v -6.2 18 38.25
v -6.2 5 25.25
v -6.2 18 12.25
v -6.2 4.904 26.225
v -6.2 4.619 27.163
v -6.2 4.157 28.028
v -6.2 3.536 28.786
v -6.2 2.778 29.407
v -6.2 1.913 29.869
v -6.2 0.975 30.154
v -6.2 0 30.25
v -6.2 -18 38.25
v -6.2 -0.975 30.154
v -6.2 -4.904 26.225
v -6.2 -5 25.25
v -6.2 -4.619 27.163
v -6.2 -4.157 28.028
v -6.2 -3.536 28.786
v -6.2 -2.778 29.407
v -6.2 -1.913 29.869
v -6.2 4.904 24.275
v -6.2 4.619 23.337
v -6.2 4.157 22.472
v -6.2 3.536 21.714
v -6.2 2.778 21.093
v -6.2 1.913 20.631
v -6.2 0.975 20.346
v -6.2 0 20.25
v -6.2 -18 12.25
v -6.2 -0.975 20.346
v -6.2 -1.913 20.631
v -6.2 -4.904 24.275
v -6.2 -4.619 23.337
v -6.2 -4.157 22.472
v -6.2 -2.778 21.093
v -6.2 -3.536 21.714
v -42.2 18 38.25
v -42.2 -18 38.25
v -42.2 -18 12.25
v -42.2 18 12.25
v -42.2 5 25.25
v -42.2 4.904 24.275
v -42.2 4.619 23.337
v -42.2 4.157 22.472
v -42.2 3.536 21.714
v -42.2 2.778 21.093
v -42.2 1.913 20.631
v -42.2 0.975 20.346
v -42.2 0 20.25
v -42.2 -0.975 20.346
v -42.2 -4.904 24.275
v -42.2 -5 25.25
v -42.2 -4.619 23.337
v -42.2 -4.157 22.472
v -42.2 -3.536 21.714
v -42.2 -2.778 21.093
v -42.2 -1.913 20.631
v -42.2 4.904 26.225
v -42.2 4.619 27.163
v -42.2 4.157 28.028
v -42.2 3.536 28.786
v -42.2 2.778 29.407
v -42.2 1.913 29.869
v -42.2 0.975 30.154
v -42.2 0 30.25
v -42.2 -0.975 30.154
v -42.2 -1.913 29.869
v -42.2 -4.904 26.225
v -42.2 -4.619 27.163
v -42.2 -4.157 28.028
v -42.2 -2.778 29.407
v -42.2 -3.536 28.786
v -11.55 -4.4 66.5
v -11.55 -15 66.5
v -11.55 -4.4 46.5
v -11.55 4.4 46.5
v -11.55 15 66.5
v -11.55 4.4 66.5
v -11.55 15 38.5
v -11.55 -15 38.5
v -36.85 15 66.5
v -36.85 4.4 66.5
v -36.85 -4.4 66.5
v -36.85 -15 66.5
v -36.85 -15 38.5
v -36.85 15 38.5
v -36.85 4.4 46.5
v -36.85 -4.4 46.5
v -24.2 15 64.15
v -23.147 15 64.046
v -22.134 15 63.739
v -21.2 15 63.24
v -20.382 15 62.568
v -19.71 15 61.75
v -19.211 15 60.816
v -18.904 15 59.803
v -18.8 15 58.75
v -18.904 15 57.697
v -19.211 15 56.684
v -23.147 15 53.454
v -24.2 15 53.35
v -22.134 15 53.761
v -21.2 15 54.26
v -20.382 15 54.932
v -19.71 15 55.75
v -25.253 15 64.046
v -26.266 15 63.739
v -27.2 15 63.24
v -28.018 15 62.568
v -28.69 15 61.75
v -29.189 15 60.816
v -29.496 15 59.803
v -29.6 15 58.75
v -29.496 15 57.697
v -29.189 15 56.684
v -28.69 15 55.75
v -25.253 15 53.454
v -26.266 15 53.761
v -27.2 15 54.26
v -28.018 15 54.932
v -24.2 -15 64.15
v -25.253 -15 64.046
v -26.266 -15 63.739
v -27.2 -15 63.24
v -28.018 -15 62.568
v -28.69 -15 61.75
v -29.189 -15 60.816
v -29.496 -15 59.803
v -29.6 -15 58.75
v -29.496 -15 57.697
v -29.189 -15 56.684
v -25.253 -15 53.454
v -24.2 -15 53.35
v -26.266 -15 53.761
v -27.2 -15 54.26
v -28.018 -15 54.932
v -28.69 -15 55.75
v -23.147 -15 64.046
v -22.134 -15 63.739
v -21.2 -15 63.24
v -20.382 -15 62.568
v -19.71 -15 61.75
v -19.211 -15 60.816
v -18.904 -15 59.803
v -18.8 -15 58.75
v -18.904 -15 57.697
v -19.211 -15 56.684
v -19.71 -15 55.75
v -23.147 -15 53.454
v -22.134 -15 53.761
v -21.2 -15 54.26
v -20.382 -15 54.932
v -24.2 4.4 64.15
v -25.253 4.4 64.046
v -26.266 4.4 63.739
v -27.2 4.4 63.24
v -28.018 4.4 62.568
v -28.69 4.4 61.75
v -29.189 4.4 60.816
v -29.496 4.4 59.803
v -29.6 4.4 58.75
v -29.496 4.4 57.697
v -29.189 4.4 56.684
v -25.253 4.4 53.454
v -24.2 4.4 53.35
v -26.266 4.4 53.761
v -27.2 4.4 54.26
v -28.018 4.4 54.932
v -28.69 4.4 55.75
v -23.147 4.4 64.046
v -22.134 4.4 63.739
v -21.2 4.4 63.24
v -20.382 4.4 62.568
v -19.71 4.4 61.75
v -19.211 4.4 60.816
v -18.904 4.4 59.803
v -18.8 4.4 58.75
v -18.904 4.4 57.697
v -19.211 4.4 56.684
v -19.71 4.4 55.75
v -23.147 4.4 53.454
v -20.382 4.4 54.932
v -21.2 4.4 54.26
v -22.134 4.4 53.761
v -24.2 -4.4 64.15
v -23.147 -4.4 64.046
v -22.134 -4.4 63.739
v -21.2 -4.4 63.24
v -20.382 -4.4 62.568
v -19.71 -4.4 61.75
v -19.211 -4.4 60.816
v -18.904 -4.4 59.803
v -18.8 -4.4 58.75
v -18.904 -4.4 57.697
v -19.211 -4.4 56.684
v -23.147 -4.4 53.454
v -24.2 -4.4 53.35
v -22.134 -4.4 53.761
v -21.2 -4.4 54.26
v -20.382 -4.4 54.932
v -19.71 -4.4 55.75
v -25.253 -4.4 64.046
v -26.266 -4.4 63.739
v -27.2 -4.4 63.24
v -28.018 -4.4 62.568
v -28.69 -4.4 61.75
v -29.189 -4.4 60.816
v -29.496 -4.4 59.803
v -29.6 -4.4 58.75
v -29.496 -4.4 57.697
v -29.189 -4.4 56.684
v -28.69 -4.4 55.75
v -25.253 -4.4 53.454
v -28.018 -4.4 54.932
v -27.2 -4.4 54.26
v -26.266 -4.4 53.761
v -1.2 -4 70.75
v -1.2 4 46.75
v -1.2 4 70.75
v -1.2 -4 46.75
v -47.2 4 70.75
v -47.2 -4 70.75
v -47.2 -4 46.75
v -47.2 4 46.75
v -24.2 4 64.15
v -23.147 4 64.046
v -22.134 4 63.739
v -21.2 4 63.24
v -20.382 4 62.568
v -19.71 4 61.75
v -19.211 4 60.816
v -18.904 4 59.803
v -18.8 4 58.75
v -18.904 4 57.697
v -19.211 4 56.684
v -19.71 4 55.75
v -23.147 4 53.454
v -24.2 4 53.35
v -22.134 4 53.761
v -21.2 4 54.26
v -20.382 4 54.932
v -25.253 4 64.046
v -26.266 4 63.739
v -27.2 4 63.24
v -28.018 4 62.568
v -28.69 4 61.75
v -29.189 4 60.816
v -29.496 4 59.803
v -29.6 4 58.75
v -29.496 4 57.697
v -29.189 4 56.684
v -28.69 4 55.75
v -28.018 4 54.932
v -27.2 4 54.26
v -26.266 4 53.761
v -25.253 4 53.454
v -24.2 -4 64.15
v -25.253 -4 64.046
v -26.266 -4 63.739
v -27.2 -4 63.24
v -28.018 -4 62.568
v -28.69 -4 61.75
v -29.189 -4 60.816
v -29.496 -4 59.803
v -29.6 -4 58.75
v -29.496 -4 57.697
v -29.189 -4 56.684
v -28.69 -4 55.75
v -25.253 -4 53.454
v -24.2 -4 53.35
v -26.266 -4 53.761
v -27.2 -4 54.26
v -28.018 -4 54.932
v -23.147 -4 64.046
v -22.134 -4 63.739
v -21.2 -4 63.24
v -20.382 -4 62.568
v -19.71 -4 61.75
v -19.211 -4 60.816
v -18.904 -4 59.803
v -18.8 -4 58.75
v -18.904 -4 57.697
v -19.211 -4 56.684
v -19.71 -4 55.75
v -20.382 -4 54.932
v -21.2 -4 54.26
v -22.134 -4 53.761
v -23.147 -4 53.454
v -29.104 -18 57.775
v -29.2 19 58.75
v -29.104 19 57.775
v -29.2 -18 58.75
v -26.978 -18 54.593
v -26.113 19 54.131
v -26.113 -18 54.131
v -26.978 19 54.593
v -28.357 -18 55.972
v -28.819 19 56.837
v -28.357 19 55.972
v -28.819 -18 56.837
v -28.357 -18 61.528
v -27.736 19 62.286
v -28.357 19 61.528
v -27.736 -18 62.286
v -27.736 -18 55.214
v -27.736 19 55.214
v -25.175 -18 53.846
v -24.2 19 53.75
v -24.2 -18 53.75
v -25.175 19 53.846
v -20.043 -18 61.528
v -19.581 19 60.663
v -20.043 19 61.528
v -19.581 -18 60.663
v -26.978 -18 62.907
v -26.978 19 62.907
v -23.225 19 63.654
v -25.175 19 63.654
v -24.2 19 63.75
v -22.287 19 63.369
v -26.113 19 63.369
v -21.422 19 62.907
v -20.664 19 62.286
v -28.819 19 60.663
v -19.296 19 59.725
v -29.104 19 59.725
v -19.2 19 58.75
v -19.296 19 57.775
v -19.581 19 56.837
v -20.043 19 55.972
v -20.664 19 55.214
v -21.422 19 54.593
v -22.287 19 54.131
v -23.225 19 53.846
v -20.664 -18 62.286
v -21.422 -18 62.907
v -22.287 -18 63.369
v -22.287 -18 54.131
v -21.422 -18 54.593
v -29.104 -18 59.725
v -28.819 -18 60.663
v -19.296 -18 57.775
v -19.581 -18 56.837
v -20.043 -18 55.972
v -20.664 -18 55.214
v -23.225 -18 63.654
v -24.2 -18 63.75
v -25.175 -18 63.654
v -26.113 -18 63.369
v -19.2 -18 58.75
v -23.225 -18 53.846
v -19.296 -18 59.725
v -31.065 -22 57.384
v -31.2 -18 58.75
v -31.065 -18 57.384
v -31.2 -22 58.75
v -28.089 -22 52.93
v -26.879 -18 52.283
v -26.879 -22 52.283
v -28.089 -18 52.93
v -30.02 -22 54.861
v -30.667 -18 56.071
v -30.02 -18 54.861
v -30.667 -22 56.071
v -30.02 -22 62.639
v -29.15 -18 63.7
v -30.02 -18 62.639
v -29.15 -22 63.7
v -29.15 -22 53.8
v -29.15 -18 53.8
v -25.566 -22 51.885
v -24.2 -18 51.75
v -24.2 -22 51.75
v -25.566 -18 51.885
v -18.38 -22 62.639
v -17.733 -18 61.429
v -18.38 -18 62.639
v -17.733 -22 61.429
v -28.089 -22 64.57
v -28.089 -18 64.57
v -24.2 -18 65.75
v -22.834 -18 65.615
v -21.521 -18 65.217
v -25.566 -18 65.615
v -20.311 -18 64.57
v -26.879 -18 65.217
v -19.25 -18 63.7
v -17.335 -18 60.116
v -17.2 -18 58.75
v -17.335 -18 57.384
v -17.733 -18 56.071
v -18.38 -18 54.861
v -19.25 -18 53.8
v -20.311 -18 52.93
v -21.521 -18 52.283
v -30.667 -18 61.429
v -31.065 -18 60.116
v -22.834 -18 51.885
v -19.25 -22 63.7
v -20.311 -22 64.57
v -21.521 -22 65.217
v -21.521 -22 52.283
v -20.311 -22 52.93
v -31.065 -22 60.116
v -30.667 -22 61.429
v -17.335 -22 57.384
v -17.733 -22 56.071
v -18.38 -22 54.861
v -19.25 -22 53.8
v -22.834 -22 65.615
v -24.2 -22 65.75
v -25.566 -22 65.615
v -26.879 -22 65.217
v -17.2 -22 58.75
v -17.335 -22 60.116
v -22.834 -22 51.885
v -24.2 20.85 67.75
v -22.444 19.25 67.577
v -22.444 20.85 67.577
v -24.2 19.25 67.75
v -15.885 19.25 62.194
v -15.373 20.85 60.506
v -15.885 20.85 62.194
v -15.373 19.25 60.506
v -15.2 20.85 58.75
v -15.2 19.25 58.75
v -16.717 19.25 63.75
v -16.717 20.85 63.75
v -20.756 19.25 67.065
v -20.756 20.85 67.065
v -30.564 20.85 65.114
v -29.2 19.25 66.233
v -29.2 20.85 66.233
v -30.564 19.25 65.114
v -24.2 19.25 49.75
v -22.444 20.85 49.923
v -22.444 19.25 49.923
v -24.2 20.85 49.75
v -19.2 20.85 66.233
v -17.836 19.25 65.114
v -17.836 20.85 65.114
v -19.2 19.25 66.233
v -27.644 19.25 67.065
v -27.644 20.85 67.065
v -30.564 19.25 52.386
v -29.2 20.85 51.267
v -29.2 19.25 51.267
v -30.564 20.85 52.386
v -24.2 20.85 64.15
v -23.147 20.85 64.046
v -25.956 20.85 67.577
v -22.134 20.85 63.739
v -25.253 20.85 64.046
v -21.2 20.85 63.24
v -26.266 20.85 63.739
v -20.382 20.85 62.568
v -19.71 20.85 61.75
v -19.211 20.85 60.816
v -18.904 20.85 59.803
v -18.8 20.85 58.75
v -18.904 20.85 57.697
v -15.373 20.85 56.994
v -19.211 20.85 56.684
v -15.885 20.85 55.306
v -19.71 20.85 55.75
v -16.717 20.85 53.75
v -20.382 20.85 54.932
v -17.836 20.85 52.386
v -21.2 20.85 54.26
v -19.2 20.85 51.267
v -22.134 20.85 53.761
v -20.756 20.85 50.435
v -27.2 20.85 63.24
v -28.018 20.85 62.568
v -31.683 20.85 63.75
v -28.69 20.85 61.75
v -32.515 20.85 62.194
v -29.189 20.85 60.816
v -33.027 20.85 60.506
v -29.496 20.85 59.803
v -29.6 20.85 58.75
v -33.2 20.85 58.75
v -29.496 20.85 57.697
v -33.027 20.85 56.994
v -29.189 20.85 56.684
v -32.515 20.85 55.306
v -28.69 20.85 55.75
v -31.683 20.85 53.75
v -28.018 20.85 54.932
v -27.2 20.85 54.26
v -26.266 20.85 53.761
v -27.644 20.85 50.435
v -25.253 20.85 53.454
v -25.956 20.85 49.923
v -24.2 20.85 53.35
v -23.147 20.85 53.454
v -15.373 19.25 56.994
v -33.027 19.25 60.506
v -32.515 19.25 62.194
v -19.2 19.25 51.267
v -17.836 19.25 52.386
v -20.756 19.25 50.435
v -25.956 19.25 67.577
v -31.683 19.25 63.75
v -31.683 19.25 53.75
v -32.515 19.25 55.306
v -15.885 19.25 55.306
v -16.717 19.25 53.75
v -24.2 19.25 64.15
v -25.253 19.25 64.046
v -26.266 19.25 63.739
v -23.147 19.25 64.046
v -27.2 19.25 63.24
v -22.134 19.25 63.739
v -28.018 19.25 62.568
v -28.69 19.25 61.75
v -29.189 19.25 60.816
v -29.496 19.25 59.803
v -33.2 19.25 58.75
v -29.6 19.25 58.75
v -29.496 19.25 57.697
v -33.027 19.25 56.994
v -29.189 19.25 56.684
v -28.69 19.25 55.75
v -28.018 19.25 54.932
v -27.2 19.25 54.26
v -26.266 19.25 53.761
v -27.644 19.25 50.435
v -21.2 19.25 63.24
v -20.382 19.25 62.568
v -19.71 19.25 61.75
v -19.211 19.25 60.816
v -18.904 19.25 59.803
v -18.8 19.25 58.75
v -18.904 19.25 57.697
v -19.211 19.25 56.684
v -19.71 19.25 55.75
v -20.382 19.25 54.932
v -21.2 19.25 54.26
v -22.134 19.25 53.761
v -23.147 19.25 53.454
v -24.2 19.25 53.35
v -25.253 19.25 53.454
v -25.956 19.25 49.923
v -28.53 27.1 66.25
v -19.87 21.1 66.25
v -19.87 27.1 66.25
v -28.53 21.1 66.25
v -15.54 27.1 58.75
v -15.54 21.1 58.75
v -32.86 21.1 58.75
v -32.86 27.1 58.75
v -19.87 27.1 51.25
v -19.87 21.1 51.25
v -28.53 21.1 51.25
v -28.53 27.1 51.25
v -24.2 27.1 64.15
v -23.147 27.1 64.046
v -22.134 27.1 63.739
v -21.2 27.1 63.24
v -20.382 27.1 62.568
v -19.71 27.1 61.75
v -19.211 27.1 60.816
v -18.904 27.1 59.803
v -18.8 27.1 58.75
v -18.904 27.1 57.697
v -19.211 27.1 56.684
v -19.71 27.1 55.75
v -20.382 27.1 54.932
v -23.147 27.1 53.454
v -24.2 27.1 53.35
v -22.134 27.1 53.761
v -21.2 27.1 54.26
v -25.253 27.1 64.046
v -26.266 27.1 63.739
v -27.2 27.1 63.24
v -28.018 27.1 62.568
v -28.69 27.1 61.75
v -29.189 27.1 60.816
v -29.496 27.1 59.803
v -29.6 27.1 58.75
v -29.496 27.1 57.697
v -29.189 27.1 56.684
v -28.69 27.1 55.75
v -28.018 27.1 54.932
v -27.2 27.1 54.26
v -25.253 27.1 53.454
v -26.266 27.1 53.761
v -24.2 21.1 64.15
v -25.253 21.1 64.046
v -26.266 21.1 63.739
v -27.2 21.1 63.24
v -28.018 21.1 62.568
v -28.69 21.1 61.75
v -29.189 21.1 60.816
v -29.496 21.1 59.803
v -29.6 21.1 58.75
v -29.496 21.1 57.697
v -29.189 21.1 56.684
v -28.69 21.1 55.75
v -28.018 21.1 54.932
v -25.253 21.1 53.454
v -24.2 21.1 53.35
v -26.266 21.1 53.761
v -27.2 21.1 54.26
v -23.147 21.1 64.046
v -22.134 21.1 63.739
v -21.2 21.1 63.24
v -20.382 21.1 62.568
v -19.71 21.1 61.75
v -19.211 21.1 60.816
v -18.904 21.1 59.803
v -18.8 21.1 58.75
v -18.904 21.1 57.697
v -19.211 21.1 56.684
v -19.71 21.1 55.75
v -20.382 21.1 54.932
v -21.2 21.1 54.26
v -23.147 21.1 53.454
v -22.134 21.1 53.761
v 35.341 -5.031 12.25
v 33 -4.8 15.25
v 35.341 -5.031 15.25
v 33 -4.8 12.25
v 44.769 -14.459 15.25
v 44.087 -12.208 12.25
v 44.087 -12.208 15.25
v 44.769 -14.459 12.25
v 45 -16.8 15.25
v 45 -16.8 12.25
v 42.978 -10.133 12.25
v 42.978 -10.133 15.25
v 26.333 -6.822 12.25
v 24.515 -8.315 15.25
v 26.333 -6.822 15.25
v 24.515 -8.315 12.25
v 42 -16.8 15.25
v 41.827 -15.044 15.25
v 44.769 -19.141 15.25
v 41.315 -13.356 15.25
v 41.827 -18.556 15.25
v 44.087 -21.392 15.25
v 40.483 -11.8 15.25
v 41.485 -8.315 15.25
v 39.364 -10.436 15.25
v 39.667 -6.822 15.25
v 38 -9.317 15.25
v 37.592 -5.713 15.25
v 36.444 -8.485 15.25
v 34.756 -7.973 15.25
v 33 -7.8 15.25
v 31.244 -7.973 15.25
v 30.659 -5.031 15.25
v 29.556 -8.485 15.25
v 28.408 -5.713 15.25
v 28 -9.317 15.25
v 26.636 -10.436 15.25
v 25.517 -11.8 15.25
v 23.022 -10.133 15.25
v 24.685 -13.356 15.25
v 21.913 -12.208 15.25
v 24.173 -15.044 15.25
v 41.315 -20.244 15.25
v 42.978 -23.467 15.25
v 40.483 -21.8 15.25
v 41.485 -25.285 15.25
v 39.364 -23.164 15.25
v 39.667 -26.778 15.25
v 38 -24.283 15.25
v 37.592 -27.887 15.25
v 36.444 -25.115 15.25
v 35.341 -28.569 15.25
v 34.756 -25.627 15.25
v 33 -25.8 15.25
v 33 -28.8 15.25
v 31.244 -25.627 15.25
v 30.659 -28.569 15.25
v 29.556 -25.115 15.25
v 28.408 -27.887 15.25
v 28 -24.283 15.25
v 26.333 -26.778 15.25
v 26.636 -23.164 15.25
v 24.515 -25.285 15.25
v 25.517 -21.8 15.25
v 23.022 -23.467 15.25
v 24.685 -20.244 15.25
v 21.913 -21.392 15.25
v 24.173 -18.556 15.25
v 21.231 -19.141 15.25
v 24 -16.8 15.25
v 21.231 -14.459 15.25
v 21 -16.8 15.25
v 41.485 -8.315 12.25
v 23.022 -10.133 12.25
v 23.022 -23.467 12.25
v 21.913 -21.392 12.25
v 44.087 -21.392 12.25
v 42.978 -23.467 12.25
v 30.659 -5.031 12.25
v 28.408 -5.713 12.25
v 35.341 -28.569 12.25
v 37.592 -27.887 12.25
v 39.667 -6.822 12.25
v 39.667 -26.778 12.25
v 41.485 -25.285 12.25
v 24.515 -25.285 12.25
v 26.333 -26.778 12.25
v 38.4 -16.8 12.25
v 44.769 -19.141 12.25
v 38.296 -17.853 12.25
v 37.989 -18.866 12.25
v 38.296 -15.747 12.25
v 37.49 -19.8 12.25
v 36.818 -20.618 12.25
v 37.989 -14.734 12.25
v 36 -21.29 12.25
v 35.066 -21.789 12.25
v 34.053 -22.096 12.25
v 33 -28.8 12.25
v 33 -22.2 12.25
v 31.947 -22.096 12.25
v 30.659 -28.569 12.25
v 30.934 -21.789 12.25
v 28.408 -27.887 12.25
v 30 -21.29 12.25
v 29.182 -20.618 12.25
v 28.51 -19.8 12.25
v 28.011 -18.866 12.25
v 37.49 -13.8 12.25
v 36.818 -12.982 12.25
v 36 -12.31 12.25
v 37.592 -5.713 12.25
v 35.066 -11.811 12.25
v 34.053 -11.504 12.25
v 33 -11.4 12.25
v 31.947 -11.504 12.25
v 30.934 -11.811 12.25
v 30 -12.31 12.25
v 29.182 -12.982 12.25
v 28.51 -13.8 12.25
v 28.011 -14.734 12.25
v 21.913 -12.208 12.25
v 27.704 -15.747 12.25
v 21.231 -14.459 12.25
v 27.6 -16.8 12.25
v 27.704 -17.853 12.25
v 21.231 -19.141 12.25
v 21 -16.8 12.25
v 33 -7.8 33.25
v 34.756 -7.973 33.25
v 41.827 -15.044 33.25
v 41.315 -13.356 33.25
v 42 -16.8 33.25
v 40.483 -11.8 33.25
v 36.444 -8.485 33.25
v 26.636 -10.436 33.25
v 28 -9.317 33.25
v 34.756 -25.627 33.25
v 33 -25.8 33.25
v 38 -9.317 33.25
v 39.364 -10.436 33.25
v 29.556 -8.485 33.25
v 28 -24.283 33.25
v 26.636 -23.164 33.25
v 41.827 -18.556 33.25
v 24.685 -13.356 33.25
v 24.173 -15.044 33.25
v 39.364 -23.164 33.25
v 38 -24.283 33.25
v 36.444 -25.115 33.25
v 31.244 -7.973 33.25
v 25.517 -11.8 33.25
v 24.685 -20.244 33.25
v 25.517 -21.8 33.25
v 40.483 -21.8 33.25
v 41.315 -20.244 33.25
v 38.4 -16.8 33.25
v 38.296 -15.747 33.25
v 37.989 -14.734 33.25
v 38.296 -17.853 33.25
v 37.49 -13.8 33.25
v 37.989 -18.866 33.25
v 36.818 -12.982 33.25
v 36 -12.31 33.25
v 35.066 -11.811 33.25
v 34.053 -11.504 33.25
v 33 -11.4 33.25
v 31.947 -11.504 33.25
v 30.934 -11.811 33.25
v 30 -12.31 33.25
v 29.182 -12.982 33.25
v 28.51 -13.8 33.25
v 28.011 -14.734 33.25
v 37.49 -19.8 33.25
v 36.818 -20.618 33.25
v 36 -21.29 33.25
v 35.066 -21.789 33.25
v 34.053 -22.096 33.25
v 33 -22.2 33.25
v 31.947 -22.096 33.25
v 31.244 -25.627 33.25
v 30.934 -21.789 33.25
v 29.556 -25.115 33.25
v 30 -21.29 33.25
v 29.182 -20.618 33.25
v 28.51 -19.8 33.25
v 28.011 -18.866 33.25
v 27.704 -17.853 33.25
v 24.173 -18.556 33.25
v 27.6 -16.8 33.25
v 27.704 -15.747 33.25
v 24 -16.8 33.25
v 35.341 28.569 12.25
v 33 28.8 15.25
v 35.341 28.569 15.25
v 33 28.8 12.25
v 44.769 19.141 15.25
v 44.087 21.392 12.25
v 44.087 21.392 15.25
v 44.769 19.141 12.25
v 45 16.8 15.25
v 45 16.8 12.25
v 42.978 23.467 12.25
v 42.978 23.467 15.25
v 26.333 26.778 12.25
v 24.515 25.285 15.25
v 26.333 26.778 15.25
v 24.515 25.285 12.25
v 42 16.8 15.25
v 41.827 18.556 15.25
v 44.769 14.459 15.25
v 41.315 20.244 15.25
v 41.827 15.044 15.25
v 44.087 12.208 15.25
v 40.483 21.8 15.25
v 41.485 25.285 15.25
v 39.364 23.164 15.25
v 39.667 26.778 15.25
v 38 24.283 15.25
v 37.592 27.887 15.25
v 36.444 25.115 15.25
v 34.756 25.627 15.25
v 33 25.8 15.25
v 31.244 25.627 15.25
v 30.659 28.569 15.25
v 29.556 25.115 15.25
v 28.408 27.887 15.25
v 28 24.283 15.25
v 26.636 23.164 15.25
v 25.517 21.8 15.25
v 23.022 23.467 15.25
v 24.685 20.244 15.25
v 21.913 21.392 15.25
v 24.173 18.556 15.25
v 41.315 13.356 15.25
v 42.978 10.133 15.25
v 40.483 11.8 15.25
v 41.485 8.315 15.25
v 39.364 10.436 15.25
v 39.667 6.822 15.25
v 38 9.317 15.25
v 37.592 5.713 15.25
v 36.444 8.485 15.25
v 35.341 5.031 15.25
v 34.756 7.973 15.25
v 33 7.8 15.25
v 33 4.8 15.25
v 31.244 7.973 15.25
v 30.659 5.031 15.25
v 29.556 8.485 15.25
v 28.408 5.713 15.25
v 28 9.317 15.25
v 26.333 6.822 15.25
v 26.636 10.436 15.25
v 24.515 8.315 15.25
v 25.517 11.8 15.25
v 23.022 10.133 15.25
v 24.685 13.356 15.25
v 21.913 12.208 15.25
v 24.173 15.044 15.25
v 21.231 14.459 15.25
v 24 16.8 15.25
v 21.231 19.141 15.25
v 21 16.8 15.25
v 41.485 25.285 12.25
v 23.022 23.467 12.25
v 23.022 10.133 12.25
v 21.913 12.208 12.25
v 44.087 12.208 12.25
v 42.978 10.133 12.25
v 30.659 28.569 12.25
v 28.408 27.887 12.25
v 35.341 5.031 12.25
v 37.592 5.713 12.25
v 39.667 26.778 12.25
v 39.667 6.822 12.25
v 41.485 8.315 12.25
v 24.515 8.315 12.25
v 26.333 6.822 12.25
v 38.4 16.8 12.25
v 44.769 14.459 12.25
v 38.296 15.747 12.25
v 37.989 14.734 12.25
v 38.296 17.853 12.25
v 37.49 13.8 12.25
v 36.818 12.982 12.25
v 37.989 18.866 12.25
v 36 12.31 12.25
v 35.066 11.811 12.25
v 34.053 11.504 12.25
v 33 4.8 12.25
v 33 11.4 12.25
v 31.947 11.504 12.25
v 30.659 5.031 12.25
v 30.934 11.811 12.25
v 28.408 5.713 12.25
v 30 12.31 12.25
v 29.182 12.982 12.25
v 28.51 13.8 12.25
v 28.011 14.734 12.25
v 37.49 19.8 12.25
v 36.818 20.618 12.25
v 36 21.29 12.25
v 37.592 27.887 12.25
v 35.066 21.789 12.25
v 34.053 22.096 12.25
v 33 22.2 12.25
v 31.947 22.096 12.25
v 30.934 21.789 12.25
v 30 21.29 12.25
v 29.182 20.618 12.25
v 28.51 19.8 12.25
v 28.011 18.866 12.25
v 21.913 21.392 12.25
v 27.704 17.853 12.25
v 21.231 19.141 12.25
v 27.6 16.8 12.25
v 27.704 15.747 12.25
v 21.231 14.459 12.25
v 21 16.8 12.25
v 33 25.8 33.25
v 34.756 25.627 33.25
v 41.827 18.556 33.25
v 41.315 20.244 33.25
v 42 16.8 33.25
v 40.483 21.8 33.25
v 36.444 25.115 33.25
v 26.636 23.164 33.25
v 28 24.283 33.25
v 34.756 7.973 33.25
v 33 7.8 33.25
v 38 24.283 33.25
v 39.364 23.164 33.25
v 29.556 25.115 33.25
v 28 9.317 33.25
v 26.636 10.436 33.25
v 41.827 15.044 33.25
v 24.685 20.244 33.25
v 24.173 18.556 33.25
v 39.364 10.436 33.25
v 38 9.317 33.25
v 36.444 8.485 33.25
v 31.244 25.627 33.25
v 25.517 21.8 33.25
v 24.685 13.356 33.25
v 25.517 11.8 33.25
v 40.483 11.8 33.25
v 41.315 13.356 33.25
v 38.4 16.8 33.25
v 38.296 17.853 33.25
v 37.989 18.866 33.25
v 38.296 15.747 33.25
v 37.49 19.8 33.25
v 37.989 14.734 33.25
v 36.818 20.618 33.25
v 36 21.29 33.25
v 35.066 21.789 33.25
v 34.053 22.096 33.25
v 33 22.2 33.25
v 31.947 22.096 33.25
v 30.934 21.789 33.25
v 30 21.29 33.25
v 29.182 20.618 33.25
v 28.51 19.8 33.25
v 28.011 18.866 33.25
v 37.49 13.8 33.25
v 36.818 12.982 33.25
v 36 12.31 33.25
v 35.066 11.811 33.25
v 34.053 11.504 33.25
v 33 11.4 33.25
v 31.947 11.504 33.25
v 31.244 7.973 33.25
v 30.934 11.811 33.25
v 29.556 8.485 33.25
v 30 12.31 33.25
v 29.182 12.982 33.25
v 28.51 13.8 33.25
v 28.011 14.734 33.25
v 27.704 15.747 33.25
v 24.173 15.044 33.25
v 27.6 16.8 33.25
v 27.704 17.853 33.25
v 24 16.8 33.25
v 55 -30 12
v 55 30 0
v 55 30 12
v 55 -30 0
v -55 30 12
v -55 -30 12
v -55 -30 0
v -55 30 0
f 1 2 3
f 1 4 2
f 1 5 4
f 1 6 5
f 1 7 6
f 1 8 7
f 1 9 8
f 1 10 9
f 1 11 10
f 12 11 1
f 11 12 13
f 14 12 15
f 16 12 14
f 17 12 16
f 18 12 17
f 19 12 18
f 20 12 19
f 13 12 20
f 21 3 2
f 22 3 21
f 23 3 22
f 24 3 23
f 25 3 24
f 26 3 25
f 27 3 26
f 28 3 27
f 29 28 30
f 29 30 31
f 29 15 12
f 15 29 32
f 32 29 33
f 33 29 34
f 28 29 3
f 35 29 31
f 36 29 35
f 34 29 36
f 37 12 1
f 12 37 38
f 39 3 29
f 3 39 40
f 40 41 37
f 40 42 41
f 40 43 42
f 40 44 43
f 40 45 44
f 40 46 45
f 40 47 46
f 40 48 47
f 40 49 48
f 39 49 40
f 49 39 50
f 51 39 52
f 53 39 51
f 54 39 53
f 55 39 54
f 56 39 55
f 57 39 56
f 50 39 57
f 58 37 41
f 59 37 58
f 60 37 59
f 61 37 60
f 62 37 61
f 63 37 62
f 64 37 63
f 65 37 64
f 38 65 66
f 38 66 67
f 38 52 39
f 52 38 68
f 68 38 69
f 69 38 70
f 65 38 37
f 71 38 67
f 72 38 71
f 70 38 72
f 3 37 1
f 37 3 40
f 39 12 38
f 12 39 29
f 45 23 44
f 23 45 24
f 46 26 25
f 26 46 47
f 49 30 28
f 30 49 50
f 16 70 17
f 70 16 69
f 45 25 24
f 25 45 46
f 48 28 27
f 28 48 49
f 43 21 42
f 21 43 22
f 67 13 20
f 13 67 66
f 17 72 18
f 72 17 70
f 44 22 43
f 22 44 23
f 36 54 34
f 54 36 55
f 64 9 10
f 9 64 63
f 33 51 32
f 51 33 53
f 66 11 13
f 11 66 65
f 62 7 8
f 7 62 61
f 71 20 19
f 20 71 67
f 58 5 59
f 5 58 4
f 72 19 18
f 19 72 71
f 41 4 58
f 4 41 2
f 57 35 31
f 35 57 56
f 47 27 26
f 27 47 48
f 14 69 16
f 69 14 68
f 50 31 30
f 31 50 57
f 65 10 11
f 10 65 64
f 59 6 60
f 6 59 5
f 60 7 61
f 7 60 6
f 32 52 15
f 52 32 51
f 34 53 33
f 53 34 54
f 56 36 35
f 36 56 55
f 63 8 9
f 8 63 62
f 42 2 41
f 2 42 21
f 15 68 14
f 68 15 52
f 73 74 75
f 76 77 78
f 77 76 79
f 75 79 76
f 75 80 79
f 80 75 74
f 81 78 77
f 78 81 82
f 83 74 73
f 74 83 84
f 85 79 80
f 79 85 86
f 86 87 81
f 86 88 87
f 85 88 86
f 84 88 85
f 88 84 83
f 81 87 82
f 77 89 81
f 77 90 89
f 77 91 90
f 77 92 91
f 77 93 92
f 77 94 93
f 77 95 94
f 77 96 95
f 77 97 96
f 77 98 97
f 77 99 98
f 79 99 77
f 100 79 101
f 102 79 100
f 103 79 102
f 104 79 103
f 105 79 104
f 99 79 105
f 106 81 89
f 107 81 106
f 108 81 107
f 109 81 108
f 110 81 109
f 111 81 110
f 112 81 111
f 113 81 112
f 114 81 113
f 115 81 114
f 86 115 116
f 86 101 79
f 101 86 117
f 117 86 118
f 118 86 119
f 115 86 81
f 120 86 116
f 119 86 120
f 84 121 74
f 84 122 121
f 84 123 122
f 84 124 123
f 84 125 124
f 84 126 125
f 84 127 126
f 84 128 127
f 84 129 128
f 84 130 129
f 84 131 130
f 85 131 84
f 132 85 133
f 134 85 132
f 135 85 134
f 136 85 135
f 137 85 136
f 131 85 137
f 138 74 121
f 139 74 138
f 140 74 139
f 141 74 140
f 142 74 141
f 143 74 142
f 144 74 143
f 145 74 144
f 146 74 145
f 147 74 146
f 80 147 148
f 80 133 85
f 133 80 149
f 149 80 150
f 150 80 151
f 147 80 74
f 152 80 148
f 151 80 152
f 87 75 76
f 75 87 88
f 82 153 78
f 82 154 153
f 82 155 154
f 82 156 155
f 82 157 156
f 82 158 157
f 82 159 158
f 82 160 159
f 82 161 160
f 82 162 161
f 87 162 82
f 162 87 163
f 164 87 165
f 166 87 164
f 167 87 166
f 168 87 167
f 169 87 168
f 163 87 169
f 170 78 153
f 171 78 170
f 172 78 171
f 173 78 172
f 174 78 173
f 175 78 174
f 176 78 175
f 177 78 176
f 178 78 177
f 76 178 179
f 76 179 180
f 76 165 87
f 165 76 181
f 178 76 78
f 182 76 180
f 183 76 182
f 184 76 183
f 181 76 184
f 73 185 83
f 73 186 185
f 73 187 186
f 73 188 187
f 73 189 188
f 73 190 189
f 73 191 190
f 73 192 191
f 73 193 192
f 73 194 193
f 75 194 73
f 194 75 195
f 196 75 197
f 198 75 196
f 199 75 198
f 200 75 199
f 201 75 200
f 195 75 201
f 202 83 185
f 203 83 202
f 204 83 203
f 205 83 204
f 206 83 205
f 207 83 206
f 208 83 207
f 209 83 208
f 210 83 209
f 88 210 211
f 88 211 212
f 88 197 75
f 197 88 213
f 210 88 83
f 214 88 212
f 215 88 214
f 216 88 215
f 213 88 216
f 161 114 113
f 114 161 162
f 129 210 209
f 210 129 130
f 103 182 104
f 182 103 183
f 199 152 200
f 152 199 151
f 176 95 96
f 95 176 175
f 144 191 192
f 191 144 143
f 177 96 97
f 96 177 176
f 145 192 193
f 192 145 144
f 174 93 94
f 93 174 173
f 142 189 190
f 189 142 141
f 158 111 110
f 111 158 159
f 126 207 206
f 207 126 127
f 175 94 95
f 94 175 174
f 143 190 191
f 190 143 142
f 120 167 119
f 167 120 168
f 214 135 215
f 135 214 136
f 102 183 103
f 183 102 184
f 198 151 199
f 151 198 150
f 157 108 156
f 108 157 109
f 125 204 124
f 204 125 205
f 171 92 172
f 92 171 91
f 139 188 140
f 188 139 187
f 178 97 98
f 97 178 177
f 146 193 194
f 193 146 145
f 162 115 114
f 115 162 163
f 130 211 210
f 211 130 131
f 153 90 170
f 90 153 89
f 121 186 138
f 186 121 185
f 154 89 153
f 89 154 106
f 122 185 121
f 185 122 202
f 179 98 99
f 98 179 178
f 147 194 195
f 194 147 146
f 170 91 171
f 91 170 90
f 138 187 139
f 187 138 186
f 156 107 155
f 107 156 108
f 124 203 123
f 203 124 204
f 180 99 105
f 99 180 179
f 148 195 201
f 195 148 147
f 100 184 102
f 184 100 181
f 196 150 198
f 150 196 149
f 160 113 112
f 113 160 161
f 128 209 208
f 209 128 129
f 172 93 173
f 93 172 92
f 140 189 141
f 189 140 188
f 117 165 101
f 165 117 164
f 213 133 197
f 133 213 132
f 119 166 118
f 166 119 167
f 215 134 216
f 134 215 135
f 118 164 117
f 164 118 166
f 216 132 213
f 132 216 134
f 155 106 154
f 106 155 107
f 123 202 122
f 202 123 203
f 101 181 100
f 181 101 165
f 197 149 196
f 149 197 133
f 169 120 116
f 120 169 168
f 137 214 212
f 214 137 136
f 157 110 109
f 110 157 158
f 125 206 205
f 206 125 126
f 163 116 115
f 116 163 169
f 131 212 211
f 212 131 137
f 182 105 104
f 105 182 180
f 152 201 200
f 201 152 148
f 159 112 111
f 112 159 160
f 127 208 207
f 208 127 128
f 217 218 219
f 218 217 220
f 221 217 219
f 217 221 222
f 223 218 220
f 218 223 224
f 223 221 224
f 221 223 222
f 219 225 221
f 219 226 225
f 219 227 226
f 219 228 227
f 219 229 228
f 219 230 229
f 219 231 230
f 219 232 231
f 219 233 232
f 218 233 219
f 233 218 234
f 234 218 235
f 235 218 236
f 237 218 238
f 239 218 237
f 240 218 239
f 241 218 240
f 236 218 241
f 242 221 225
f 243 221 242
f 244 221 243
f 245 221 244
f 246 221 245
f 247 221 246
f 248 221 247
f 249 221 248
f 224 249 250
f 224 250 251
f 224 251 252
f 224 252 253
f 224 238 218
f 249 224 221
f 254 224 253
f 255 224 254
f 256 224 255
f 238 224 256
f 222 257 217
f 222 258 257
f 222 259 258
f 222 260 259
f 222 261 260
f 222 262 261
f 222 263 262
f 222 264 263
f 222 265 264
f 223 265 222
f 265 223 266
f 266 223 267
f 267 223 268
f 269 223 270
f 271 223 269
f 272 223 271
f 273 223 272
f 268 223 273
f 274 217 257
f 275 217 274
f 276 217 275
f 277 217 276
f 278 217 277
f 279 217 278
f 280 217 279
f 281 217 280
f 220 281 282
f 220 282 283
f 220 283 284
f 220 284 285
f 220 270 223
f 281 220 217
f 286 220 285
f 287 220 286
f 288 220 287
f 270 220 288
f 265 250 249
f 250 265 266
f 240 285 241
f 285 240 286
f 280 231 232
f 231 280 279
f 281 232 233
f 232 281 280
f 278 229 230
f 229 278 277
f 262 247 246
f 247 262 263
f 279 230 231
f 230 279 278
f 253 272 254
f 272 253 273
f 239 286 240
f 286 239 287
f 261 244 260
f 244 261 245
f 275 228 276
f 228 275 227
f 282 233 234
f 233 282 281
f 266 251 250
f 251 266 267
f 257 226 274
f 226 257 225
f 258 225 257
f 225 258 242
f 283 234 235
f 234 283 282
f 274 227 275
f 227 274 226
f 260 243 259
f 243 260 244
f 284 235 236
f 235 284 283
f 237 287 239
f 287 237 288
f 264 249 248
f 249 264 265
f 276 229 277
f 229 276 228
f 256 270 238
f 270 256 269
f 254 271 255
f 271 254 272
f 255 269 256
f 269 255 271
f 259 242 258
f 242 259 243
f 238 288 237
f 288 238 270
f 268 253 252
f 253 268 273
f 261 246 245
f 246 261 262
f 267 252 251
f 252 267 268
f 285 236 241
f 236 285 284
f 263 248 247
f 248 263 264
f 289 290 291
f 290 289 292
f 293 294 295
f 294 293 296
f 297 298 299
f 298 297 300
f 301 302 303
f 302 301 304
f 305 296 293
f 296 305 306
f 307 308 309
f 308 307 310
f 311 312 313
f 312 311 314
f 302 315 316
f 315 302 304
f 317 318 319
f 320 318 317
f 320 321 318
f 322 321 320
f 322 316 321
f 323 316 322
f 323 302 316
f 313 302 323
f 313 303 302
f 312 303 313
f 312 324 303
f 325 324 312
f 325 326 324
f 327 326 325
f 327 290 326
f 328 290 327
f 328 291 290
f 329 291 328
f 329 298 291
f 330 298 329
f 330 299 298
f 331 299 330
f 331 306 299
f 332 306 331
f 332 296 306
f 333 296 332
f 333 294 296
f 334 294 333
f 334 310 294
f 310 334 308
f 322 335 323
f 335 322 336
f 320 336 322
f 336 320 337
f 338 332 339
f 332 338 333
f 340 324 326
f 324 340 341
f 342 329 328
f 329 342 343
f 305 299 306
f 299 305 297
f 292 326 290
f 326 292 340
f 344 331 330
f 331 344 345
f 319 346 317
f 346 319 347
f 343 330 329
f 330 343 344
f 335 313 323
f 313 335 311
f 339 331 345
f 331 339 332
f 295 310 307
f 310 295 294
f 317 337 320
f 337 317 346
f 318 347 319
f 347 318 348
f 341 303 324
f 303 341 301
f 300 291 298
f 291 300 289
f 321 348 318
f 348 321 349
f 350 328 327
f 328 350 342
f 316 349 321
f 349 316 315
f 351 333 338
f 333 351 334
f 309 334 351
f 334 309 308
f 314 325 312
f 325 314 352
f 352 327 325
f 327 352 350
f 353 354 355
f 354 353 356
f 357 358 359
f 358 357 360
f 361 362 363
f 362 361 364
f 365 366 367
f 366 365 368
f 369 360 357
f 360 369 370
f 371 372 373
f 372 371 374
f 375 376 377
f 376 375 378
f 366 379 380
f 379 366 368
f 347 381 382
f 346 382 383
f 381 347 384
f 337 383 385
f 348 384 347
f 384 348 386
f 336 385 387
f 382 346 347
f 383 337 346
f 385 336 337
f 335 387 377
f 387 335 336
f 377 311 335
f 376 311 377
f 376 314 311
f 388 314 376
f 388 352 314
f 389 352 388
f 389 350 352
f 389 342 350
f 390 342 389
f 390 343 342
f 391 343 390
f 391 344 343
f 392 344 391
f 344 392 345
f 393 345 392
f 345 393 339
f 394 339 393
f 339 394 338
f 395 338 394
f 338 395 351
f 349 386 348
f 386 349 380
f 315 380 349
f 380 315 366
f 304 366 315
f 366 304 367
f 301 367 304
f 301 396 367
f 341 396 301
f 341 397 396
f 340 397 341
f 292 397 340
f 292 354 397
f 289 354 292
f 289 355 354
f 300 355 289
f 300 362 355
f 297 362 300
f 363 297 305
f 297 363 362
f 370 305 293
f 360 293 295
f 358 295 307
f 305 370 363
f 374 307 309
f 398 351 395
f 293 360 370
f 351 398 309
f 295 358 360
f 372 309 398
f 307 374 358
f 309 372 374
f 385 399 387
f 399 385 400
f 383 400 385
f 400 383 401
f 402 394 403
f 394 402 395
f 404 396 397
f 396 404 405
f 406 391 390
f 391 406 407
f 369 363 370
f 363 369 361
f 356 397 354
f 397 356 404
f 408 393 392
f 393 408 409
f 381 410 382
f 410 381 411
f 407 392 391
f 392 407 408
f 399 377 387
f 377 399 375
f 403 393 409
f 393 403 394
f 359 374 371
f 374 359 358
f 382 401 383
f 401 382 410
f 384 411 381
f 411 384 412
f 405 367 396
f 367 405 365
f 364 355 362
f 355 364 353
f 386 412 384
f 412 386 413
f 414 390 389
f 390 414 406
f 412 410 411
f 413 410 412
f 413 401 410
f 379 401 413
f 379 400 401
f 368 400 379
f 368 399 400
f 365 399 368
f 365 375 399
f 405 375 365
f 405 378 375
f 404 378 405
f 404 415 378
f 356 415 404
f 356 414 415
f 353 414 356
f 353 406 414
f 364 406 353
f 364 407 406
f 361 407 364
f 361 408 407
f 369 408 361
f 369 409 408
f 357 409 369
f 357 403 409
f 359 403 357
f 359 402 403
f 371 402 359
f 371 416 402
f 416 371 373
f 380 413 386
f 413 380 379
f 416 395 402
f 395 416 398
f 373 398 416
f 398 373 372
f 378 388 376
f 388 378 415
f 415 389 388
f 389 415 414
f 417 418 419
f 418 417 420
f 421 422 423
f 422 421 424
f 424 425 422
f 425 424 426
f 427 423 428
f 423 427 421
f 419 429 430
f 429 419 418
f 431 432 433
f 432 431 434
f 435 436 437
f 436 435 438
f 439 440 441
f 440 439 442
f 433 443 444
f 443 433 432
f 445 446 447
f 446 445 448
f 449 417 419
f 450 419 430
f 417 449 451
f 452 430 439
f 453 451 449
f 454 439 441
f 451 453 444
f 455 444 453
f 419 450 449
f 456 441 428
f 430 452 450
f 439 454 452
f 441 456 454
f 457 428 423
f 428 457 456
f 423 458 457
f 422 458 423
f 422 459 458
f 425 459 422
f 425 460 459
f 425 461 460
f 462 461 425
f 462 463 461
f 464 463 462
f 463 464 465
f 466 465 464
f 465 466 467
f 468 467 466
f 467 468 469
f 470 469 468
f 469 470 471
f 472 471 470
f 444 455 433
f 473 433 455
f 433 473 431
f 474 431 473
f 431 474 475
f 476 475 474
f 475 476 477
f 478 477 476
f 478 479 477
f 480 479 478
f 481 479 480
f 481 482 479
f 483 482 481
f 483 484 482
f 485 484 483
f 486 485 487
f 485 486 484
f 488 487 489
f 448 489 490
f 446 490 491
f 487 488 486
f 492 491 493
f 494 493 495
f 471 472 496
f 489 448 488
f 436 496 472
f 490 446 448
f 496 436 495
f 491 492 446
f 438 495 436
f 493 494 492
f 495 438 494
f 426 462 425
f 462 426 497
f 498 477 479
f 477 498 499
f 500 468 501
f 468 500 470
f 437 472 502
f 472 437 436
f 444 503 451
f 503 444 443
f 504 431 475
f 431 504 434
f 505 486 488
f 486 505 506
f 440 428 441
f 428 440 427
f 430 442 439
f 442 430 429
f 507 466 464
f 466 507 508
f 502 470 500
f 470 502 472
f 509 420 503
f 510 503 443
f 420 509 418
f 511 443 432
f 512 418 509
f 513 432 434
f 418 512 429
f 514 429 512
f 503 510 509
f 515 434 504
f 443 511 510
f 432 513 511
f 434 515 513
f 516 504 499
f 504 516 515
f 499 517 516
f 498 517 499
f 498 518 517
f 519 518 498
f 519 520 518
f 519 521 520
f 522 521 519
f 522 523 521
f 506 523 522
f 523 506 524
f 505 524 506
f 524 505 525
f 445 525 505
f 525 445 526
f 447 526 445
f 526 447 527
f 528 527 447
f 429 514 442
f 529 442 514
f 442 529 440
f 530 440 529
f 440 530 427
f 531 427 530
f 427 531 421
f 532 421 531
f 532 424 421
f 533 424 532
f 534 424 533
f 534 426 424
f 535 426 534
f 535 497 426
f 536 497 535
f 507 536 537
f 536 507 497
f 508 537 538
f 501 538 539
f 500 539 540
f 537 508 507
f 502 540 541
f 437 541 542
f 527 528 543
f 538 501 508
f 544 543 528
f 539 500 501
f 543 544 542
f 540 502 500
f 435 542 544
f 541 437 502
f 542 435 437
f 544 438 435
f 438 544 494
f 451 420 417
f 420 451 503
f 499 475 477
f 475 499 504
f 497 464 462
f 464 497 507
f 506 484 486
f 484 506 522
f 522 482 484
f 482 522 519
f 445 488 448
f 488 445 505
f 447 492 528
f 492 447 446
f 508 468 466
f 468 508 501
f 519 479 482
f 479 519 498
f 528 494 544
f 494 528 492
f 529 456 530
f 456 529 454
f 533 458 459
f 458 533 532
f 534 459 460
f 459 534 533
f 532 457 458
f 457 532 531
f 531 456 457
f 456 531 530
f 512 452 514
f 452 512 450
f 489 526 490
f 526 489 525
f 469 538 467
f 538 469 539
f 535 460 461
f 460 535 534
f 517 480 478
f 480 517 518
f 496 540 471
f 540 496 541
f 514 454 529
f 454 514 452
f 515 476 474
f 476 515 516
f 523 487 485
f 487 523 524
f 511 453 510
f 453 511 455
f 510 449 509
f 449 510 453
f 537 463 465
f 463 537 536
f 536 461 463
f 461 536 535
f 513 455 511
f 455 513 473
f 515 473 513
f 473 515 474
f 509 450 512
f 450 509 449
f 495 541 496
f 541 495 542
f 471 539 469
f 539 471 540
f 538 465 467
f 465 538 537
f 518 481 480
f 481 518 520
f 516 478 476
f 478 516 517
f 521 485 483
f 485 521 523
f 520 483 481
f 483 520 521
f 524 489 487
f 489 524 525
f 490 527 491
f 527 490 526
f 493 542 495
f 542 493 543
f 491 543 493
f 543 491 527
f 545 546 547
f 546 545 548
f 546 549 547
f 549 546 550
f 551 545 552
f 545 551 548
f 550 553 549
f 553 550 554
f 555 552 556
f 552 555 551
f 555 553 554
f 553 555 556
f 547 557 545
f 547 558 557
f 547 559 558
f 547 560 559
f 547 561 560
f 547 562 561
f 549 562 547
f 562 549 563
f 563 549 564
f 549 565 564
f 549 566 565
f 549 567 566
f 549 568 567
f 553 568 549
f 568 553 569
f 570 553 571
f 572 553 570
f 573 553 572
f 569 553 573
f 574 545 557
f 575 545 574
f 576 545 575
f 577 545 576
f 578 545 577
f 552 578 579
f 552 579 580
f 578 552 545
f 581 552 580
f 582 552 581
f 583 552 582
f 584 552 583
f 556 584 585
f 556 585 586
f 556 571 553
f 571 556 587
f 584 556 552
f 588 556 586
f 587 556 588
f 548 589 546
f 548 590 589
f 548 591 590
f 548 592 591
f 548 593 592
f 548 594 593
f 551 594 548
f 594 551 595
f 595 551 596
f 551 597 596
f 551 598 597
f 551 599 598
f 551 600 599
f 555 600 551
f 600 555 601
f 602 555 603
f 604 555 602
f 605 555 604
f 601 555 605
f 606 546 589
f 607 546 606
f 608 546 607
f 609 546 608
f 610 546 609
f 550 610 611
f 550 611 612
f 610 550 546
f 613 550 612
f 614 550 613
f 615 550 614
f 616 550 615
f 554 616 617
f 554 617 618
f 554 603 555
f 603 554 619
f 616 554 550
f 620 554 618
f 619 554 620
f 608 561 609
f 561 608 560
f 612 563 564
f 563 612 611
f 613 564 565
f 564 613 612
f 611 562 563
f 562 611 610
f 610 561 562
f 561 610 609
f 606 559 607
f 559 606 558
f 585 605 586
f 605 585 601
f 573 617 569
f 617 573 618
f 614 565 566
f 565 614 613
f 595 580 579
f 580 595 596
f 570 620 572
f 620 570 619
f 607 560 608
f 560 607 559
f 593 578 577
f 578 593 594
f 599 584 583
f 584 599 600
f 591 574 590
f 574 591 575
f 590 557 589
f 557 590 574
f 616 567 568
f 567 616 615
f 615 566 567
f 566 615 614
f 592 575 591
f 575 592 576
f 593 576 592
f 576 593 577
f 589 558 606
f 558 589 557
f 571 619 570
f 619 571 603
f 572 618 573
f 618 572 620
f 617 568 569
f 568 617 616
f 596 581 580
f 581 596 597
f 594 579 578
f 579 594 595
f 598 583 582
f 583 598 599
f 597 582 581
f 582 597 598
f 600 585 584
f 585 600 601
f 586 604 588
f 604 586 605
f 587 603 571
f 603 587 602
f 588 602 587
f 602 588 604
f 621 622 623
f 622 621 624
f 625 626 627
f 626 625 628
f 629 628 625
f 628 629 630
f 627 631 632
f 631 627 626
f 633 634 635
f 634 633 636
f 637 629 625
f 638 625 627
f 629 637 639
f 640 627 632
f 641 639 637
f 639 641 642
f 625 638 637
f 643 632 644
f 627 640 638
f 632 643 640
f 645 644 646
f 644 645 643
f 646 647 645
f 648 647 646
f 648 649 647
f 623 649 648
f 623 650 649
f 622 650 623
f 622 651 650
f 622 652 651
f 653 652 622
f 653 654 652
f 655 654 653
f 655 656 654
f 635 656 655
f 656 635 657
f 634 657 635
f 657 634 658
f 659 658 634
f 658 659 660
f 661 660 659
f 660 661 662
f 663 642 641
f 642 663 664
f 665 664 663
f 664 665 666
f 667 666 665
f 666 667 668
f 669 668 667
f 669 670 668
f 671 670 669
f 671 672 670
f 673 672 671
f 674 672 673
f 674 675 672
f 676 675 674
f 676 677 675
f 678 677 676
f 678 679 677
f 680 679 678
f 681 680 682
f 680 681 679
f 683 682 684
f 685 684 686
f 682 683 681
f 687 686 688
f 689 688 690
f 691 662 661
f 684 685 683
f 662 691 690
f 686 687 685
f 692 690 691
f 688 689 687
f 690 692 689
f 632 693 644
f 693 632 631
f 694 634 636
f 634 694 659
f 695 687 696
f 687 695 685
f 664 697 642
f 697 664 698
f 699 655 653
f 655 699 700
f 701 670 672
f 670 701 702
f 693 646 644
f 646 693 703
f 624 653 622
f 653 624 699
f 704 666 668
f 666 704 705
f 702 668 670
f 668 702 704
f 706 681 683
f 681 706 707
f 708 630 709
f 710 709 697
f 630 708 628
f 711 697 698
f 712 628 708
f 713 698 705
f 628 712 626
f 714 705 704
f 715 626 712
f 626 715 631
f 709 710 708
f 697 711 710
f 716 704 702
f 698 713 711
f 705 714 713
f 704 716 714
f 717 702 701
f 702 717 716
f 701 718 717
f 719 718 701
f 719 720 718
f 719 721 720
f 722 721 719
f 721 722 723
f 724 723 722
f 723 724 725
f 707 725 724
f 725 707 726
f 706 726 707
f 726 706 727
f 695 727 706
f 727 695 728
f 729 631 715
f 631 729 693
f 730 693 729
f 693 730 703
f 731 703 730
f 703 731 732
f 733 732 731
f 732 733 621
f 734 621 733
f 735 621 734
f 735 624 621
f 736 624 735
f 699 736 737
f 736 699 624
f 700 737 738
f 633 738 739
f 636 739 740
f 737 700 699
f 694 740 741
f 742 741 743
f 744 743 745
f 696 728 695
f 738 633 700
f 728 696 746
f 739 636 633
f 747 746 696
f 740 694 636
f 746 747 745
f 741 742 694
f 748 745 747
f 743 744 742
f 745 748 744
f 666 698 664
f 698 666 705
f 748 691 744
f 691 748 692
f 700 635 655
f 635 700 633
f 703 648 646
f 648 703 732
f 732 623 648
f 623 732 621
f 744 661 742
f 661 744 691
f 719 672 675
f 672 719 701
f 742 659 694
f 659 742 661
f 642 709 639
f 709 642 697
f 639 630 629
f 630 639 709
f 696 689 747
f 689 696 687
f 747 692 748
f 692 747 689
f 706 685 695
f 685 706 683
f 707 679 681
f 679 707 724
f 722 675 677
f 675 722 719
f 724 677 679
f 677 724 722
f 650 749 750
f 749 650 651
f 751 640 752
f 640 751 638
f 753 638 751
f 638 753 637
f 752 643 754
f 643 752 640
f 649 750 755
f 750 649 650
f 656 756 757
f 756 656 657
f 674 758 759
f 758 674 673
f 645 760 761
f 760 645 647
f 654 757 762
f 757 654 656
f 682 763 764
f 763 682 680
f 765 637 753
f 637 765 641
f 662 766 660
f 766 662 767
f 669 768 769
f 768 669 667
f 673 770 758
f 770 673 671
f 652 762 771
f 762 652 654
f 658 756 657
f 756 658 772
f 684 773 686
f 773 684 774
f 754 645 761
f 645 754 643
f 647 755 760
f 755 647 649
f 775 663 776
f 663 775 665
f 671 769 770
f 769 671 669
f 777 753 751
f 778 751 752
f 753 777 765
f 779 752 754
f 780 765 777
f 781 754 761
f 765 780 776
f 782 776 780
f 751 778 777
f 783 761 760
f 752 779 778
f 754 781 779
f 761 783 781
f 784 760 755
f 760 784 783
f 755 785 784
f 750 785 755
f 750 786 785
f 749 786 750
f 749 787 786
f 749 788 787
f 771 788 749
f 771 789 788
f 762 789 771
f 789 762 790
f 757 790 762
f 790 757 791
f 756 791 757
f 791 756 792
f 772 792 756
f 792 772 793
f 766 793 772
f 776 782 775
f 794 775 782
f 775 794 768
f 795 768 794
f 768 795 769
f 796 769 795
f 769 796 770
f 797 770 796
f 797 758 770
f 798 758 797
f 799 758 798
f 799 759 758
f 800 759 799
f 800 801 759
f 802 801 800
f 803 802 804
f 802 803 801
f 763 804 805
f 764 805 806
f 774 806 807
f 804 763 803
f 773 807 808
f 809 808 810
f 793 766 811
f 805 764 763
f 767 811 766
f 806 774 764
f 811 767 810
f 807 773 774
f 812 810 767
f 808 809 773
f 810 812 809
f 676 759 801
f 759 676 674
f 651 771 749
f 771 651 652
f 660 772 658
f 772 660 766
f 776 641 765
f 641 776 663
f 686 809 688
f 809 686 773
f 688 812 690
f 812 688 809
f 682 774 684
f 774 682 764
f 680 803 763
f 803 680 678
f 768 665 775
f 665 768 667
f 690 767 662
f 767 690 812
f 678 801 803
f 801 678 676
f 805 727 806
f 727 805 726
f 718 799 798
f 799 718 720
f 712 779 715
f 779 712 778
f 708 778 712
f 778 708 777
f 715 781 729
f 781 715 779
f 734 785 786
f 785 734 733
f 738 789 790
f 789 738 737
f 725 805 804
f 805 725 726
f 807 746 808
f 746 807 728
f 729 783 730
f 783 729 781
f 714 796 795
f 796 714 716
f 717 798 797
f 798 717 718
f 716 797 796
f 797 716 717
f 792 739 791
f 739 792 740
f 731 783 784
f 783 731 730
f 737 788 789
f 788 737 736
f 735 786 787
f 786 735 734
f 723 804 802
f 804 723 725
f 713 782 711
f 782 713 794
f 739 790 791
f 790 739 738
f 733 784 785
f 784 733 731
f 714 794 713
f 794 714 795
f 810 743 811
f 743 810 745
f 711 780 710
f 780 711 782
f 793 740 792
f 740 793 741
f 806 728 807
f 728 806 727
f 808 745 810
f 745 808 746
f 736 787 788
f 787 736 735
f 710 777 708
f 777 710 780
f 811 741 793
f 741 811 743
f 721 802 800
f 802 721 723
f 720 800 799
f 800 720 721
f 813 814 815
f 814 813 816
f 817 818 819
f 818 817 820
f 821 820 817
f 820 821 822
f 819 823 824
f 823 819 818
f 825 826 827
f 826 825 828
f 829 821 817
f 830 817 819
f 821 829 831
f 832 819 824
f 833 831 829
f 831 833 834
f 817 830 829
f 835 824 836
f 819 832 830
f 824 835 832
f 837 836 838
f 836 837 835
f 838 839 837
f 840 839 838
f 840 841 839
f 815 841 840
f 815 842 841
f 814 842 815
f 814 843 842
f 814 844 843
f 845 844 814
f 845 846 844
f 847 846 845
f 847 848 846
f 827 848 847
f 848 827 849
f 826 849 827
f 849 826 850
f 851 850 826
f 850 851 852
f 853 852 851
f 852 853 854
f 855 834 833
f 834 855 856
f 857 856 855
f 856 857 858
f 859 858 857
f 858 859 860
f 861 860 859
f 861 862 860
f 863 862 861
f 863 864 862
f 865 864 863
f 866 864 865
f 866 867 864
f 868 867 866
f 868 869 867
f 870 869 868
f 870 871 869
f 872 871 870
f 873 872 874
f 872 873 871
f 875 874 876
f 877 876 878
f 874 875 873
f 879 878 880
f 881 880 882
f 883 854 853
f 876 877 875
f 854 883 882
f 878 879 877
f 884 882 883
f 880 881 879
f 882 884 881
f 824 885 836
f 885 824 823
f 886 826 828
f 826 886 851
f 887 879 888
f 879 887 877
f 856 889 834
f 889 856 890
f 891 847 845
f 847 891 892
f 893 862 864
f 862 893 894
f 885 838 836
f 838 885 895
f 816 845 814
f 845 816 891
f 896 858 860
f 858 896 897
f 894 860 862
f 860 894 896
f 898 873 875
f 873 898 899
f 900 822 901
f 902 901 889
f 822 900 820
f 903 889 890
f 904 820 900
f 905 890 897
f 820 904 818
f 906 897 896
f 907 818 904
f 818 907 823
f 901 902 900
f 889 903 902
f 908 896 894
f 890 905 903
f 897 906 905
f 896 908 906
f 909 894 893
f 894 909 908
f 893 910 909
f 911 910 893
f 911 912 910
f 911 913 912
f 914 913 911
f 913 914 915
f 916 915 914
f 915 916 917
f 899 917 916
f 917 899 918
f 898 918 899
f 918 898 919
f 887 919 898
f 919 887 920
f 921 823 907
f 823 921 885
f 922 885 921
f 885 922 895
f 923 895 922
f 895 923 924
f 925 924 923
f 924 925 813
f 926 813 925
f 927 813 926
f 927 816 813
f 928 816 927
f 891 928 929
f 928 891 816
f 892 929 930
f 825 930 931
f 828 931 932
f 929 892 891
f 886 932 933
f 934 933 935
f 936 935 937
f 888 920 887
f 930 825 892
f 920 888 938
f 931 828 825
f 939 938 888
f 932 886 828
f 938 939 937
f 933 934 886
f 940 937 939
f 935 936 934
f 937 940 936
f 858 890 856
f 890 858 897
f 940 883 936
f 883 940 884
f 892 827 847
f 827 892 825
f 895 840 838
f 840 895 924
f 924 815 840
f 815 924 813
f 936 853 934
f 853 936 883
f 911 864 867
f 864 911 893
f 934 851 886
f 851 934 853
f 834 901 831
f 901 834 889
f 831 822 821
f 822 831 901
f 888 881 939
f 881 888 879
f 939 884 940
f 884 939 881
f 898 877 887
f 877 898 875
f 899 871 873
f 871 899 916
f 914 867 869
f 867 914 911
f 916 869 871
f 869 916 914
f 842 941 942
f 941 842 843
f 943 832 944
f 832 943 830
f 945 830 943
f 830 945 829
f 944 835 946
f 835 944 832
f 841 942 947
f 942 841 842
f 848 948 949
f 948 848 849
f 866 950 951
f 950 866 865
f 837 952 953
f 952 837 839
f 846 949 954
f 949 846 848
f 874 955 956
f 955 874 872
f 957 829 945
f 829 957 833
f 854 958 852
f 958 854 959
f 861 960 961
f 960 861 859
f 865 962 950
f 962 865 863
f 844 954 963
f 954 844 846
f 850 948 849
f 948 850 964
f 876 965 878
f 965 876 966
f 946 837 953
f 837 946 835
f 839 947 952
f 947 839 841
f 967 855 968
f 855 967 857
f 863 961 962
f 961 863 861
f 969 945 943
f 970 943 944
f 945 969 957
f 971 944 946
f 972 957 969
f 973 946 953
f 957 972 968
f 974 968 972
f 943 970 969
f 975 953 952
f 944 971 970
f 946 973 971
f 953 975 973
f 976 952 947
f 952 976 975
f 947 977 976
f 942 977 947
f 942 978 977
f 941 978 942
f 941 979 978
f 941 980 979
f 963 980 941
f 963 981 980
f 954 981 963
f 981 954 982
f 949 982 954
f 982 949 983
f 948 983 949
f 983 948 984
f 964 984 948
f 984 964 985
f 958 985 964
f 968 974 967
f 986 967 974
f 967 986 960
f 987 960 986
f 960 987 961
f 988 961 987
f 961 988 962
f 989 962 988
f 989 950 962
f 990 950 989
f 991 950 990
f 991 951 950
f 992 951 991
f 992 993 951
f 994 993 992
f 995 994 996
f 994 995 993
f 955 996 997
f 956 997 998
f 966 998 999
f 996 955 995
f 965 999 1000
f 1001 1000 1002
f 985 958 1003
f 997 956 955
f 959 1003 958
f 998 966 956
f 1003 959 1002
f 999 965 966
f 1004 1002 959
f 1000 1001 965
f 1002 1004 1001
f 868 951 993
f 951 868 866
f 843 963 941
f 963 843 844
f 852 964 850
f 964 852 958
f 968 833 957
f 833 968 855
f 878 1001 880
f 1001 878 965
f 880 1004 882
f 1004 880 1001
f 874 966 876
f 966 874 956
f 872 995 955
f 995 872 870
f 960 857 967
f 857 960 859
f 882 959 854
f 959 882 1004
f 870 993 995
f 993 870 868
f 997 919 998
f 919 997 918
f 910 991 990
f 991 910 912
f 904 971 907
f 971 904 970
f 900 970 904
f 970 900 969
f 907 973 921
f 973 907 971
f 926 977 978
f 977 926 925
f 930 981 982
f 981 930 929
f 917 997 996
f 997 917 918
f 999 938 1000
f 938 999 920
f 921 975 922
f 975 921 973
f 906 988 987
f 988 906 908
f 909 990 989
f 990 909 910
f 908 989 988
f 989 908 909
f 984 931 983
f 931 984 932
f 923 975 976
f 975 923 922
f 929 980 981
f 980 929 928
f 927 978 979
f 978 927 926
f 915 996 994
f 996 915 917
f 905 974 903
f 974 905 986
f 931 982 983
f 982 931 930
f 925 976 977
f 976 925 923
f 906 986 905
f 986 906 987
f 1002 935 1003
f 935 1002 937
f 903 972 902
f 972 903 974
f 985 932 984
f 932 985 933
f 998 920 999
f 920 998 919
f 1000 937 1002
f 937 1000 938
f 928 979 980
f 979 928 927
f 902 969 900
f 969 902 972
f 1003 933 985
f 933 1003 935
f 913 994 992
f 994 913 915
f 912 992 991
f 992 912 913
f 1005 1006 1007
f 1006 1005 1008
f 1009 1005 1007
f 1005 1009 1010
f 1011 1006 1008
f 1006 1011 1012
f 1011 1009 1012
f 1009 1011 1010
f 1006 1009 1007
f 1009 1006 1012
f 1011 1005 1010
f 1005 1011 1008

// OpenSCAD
$fn = 32;

// ------------------------------------------------------------------------
// Indexing jig: plate 110 x 60 mm, pin d10
// Every part is its own module, assembly() places every instance.
// ------------------------------------------------------------------------

// --- part 1 ---
module jig_plate() {
  difference() {
    translate([-55, -30, 0]) cube([110, 60, 12]);
  }
}

// --- part 2 ---
module locator_block() {
  difference() {
    translate([-18, -18, 0]) cube([36, 36, 26]);
    translate([0, 0, 13]) rotate([0, 90, 0]) cylinder(h = 38, d = 10, center = true);
  }
}

// --- part 3 ---
module index_fork() {
  difference() {
    translate([-12.65, -15, 0]) cube([25.3, 30, 28]);
    translate([-13.65, -4.4, 8]) cube([27.3, 8.8, 21]);
    translate([0, 0, 20.25]) rotate([90, 0, 0]) cylinder(h = 32, d = 10.8, center = true);
  }
}

// --- part 4 ---
module index_arm() {
  difference() {
    translate([-23, -4, 0]) cube([46, 8, 24]);
    translate([0, 0, 12]) rotate([90, 0, 0]) cylinder(h = 10, d = 10.8, center = true);
  }
}

// --- part 5 ---
module index_pin() {
  rotate([0, 90, 0]) cylinder(h = 38, d = 10, center = true);
  translate([-22, 0, 0]) rotate([0, 90, 0]) cylinder(h = 4, d = 14);
}

// --- part 6 ---
module pin_washer() {
  difference() {
      translate([0, 0, 0]) cylinder(h = 1.6, d = 18);
      translate([0, 0, -1]) cylinder(h = 3.6, d = 10.8);
    }
}

// --- part 7 ---
module lock_nut() {
  difference() {
    linear_extrude(height = 6) polygon(points = [[8.66, 0], [4.33, 7.5], [-4.33, 7.5], [-8.66, 0], [-4.33, -7.5], [4.33, -7.5]]);
    translate([0, 0, -1]) cylinder(h = 8, d = 10.8);
  }
}

// --- part 8 ---
module guide_bush_a() {
  difference() {
    union() {
      cylinder(h = 3, d = 24);
      translate([0, 0, 3]) cylinder(h = 18, d = 18);
    }
    translate([0, 0, -1]) cylinder(h = 23, d = 10.8);
  }
}

// --- part 9 ---
module guide_bush_b() {
  difference() {
    union() {
      cylinder(h = 3, d = 24);
      translate([0, 0, 3]) cylinder(h = 18, d = 18);
    }
    translate([0, 0, -1]) cylinder(h = 23, d = 10.8);
  }
}

// --- assembly ---
module assembly() {
  color([0.80, 0.24, 0.20]) translate([0, 0, 0]) rotate([0, 0, 0]) jig_plate();
  color([0.20, 0.45, 0.75]) translate([-24.2, 0, 12.25]) rotate([0, 0, 0]) locator_block();
  color([0.25, 0.62, 0.32]) translate([-24.2, 0, 38.5]) rotate([0, 0, 0]) index_fork();
  color([0.92, 0.70, 0.18]) translate([-24.2, 0, 46.75]) rotate([0, 0, 0]) index_arm();
  color([0.58, 0.35, 0.70]) translate([-24.2, 0, 58.75]) rotate([0, 0, 90]) index_pin();
  color([0.16, 0.66, 0.66]) translate([-24.2, 20.85, 58.75]) rotate([90, 0, 0]) pin_washer();
  color([0.85, 0.48, 0.18]) translate([-24.2, 27.1, 58.75]) rotate([90, 0, 0]) lock_nut();
  color([0.55, 0.60, 0.65]) translate([33, -16.8, 12.25]) rotate([0, 0, 0]) guide_bush_a();
  color([0.75, 0.30, 0.55]) translate([33, 16.8, 12.25]) rotate([0, 0, 0]) guide_bush_b();
}

assembly();
